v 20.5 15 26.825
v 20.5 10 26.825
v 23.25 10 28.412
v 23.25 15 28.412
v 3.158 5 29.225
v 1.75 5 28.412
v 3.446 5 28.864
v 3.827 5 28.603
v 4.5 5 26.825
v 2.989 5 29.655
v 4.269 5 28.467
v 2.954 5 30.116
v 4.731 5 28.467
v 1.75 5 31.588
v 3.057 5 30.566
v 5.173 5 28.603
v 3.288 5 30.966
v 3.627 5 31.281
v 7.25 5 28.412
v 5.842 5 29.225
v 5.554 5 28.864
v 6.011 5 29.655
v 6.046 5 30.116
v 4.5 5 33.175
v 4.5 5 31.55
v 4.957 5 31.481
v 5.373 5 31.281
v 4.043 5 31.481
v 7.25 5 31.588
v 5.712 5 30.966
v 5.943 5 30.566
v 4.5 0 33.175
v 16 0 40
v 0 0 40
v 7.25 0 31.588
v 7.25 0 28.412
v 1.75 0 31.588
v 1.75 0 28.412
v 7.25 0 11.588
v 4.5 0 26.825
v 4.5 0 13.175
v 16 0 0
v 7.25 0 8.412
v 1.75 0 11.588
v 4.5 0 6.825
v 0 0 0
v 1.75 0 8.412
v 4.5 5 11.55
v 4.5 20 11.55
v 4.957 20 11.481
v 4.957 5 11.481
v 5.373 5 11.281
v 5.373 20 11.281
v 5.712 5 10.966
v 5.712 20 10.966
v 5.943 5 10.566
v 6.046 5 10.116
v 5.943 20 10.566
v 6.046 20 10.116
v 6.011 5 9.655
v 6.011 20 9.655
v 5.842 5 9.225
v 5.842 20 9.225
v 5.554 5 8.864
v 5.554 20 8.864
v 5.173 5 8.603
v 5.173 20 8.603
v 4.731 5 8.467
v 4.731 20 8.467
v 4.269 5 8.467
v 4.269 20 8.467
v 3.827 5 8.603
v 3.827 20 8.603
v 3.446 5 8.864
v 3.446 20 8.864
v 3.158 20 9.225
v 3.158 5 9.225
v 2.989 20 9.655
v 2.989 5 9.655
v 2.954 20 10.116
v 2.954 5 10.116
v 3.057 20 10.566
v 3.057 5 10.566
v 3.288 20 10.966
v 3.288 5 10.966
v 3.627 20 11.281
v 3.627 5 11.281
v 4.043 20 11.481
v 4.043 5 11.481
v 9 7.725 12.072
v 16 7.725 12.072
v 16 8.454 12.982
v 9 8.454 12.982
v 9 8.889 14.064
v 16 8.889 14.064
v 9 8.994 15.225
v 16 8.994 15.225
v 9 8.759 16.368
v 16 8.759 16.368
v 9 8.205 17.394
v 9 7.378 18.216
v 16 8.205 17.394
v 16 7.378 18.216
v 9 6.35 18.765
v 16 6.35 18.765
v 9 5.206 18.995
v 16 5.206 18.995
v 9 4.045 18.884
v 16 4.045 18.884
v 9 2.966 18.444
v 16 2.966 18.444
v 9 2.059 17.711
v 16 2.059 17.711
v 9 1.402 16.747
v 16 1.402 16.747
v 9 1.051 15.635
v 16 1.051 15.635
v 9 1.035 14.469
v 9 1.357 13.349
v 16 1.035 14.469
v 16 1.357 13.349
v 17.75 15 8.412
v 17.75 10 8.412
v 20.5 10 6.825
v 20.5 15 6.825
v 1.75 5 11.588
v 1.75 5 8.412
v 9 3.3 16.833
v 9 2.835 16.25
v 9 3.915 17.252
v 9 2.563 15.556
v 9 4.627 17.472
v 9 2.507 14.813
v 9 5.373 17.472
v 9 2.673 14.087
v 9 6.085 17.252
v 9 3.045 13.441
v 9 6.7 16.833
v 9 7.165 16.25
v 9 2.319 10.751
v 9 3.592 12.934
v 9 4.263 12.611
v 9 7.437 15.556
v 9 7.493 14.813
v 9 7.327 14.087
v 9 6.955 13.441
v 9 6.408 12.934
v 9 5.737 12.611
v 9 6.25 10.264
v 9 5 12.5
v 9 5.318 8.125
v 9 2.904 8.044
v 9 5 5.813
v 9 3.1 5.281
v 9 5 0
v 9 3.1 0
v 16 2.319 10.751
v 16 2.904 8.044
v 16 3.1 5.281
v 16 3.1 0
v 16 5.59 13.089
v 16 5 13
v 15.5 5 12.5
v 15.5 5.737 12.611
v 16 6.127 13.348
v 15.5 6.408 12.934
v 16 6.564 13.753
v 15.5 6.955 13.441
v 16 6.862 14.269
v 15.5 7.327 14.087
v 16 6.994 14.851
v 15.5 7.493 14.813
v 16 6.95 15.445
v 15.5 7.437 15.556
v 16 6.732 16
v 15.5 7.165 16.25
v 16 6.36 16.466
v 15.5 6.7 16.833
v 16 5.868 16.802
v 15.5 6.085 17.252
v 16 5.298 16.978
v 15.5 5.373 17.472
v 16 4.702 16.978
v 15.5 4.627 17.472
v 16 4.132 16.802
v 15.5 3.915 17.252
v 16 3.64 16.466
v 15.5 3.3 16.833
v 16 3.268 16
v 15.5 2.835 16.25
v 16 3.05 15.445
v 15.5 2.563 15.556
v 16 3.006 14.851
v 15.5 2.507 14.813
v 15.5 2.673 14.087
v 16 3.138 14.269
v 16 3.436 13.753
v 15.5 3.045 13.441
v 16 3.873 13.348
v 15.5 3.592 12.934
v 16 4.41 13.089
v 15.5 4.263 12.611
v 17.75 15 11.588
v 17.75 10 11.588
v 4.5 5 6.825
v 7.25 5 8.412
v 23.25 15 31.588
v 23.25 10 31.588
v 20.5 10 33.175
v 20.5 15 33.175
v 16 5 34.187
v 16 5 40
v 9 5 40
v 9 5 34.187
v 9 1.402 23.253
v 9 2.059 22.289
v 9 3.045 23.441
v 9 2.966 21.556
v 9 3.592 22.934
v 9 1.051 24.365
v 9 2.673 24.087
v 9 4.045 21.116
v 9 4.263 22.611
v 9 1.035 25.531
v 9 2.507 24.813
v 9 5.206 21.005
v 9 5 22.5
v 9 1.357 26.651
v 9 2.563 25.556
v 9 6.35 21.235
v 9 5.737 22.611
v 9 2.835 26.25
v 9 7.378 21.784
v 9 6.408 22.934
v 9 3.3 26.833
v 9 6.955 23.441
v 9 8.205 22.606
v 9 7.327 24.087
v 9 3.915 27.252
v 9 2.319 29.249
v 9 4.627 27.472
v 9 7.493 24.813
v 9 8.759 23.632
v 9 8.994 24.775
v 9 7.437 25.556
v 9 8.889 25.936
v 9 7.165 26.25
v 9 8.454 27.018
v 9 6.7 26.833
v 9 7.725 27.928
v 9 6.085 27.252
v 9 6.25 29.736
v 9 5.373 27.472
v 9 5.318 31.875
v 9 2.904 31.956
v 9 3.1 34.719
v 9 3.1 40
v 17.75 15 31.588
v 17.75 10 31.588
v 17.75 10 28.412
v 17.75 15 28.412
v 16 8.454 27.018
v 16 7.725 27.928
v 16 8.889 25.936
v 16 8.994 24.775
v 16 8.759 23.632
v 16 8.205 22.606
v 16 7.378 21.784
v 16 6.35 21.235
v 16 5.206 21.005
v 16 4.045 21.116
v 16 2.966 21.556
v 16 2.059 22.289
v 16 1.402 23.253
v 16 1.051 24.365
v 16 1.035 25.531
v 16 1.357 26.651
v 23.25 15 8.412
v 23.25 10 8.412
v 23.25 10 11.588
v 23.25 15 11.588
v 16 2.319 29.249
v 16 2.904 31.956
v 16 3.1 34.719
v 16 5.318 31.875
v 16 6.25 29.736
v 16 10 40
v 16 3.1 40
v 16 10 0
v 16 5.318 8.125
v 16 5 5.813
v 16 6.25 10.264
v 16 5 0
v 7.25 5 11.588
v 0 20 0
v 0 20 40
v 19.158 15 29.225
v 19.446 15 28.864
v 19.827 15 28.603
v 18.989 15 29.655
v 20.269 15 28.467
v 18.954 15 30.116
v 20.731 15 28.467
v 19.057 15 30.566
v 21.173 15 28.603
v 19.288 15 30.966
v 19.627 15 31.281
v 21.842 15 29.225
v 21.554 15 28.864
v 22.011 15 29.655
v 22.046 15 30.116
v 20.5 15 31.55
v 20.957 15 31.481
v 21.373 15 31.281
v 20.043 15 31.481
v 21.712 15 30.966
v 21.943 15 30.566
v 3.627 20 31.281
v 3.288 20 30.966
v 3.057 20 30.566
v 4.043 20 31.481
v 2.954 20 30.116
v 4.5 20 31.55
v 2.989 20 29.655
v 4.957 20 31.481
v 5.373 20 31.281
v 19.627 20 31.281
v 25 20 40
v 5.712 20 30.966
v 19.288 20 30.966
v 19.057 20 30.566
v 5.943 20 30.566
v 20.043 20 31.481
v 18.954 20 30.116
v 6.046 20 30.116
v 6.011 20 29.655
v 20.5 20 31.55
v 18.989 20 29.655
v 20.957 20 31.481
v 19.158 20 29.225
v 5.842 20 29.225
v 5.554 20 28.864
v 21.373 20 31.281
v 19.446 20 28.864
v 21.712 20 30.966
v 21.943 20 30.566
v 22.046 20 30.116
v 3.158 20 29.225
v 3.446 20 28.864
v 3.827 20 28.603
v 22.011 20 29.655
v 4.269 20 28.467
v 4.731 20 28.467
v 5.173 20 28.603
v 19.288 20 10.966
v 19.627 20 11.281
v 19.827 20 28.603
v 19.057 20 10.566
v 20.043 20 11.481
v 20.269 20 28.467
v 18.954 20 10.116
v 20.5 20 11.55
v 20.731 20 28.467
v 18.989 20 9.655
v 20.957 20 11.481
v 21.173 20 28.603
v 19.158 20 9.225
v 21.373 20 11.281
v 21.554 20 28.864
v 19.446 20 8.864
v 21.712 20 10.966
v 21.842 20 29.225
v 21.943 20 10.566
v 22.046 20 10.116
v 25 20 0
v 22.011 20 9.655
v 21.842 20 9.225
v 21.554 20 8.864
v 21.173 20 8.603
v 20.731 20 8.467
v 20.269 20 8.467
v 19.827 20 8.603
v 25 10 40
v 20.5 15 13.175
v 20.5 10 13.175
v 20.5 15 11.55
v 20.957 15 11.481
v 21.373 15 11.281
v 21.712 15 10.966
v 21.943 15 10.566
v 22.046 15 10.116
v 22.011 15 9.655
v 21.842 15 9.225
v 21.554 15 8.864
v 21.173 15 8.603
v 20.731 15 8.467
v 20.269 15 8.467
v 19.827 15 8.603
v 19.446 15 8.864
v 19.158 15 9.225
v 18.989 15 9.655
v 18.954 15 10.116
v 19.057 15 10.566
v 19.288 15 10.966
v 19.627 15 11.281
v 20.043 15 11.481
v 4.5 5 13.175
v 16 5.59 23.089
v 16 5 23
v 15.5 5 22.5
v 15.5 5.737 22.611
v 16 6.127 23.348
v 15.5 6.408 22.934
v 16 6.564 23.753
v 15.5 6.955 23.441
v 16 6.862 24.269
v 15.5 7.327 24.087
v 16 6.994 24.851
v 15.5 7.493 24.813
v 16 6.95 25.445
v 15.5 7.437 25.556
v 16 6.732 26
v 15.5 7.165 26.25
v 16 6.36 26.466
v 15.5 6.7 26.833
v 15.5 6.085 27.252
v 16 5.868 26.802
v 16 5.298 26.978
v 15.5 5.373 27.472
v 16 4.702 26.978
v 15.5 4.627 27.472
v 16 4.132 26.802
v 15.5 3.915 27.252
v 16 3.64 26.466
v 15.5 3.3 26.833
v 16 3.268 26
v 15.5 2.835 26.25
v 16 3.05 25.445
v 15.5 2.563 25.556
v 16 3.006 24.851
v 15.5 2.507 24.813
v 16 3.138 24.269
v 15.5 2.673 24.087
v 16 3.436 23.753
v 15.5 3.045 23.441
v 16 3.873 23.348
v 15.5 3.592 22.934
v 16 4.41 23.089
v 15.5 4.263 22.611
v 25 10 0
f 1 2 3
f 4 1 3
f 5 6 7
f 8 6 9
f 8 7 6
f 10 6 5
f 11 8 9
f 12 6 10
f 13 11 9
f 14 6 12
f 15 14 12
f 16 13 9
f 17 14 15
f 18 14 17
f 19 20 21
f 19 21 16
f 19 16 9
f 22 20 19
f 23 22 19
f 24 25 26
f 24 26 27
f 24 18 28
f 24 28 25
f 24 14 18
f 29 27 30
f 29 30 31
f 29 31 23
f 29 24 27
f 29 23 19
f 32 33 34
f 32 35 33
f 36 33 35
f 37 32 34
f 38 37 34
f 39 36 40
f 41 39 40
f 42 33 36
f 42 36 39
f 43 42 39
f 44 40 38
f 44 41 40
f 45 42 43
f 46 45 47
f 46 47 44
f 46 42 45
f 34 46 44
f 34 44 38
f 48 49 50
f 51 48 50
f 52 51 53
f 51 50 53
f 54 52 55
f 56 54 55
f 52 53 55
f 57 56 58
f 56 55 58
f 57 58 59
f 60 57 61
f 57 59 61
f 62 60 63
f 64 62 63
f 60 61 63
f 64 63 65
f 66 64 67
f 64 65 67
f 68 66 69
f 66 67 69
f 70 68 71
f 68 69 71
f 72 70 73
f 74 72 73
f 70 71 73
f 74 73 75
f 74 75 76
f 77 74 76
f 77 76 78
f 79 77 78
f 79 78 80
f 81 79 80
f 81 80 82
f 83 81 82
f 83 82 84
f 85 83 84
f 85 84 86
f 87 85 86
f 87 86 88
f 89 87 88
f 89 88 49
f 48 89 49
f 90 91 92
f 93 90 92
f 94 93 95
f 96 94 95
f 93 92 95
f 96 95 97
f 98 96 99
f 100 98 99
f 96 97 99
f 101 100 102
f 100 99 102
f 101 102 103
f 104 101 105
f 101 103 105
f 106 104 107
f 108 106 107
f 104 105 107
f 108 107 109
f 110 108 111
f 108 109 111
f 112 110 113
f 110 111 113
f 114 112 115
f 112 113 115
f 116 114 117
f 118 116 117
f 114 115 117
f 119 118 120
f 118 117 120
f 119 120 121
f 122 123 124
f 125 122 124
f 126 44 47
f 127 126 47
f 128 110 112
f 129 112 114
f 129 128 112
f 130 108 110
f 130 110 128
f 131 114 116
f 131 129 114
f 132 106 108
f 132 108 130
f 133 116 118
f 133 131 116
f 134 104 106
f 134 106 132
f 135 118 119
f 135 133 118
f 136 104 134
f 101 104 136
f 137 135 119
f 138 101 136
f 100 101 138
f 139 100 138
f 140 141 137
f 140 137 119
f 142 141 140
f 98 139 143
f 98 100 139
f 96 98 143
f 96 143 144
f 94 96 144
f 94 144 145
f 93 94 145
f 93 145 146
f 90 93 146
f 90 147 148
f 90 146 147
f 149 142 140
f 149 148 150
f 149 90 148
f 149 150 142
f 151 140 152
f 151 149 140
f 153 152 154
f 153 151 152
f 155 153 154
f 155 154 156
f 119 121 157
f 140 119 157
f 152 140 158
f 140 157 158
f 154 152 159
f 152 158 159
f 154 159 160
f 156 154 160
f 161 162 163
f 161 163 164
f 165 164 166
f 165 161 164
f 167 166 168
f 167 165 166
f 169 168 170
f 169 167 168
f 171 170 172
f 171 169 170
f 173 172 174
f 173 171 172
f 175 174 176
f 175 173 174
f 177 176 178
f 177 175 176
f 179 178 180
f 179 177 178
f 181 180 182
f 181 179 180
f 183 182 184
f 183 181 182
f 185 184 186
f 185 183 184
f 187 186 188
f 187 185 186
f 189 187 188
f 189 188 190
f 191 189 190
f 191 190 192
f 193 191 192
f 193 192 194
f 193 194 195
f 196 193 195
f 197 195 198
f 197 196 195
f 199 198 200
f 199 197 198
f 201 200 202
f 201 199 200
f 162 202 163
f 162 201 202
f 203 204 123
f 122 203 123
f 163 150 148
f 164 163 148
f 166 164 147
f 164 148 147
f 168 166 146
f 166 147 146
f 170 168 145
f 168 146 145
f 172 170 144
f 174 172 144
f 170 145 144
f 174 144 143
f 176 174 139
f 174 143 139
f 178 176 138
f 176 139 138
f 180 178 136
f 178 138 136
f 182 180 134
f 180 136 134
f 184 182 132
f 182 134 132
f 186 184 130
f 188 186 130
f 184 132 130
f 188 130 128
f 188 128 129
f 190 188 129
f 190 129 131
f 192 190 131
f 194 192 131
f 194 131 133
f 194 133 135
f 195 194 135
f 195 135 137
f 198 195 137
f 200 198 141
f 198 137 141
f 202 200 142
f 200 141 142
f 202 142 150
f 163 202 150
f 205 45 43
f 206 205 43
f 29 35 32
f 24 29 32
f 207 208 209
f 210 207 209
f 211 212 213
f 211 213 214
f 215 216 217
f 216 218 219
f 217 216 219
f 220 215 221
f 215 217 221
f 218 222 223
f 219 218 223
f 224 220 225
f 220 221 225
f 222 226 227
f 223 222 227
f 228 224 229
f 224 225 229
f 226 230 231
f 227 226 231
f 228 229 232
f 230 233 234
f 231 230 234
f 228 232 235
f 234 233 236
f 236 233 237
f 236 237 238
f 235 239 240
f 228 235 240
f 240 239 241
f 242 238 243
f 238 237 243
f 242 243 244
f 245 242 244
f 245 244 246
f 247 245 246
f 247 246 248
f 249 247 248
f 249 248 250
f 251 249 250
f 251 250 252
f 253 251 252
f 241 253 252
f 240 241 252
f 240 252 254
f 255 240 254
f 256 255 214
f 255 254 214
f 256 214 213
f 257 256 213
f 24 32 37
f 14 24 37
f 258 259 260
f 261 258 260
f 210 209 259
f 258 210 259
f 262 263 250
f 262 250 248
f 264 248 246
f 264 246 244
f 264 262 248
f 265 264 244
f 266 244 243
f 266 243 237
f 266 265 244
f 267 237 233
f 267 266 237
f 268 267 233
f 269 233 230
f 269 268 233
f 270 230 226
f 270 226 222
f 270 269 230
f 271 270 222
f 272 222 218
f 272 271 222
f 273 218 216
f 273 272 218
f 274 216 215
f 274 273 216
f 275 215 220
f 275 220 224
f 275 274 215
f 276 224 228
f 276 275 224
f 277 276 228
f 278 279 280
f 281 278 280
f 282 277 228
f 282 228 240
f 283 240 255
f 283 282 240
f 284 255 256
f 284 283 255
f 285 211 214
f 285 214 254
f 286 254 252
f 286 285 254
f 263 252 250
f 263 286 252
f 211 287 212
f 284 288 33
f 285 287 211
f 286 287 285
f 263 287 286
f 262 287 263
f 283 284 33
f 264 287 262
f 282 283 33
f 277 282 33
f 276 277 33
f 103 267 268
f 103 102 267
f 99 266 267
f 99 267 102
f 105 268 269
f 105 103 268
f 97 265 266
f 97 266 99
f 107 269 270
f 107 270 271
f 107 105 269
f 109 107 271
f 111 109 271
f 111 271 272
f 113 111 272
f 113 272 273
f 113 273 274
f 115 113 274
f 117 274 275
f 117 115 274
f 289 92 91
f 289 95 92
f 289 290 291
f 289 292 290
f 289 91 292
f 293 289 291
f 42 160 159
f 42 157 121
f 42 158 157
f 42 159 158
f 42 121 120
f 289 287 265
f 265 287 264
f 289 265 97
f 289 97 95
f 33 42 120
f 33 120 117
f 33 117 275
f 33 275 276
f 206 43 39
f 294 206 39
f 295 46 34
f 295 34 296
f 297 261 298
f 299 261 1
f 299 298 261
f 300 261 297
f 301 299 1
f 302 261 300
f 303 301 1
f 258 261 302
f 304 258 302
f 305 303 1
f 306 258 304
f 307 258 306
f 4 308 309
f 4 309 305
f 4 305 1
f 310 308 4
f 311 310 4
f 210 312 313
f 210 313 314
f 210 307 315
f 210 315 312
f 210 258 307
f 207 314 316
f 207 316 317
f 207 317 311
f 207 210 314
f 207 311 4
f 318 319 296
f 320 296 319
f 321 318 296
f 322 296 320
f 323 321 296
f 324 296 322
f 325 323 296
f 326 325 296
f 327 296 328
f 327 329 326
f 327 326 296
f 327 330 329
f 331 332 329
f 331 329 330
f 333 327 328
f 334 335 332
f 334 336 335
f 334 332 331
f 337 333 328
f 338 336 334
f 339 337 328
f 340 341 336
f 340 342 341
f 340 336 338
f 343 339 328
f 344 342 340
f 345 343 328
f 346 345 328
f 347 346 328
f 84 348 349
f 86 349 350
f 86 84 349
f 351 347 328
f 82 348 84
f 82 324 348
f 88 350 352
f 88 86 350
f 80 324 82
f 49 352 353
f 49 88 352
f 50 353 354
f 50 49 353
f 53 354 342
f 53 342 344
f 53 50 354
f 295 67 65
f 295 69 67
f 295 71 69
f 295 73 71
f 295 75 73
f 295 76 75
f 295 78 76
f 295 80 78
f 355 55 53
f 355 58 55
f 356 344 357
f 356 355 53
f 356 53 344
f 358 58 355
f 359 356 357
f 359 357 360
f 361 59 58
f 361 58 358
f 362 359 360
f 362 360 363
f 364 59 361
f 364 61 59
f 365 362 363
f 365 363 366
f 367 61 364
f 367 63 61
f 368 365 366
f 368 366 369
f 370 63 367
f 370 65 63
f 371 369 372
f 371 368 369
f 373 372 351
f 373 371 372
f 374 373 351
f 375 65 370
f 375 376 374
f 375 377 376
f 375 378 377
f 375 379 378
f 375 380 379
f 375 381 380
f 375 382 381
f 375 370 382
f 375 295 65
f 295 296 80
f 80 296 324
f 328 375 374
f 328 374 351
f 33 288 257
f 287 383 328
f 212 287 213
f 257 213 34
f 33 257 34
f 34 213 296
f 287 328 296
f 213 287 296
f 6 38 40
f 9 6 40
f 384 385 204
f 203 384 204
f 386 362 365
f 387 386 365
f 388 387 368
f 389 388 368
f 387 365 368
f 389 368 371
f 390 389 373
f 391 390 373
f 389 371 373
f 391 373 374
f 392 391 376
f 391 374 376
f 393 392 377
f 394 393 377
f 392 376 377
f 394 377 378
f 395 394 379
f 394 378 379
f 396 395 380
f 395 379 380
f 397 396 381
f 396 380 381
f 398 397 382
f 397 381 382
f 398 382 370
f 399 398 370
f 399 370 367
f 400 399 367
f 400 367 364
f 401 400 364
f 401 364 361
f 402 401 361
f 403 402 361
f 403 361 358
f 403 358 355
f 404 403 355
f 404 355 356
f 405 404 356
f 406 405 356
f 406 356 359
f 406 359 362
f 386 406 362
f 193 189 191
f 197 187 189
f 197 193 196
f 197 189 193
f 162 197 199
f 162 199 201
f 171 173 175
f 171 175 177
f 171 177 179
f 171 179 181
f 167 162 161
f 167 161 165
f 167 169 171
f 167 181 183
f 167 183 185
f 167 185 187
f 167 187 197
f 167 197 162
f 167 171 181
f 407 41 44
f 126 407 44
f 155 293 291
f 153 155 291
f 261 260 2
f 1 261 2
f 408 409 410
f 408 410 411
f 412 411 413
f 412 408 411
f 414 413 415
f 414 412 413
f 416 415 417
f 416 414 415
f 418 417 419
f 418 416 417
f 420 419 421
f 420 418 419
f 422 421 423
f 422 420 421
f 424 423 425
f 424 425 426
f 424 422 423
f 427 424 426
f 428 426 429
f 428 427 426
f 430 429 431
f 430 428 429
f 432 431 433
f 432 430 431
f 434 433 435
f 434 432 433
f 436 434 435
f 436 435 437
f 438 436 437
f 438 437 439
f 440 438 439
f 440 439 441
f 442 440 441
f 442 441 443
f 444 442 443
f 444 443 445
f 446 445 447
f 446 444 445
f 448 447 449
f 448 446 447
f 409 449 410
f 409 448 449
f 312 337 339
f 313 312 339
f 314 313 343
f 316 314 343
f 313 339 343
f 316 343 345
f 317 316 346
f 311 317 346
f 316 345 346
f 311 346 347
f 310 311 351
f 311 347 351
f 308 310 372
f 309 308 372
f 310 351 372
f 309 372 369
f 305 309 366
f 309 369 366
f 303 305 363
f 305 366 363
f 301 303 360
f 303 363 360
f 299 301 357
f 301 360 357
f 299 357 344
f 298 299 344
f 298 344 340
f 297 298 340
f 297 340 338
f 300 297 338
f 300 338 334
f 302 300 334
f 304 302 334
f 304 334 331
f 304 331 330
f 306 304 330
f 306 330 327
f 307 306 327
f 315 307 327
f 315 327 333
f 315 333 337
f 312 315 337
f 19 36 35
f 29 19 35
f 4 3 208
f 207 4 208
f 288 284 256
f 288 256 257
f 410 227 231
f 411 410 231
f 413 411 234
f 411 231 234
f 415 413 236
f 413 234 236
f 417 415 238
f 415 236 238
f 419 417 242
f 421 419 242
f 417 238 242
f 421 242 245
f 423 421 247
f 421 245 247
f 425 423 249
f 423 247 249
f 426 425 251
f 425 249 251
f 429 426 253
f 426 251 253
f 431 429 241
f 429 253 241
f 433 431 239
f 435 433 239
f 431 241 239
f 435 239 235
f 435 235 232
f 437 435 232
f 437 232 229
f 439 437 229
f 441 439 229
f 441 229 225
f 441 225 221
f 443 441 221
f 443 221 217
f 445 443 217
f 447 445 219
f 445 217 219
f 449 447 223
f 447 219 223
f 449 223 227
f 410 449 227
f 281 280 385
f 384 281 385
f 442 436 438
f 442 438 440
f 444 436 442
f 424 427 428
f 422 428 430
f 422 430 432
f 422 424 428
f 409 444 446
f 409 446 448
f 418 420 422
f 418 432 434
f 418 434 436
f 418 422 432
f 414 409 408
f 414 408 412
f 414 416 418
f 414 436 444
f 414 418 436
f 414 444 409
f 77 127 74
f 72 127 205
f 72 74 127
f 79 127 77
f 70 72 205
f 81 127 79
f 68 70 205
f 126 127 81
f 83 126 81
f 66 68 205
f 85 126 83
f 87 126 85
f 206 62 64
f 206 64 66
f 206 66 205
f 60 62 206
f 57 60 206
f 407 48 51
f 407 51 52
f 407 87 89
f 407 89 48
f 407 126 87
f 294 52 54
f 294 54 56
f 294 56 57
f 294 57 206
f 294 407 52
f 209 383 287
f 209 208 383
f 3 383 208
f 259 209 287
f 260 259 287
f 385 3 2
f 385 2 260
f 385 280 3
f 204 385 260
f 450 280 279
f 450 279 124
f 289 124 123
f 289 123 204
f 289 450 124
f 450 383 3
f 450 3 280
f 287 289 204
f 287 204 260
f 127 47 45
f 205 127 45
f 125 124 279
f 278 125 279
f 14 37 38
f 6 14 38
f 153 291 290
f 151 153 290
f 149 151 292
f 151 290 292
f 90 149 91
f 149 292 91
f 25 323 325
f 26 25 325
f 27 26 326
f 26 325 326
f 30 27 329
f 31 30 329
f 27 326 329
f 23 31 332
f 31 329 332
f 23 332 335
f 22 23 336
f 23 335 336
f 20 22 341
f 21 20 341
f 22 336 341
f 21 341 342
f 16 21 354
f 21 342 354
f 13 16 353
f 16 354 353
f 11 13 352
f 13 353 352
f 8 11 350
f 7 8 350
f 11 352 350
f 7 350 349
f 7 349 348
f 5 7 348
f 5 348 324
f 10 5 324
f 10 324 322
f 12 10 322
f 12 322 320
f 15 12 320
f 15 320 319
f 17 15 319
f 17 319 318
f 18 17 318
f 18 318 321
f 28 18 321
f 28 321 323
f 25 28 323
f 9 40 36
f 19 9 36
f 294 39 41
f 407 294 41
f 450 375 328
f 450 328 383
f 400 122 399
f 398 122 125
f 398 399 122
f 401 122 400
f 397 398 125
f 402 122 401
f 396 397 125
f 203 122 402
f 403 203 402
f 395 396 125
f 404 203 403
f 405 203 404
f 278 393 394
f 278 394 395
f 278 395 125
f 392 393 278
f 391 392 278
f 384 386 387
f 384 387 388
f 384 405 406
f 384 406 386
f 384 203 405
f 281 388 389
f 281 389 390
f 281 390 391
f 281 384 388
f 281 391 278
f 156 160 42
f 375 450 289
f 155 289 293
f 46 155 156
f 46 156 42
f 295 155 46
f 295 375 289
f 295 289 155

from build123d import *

# Parameters (mm, degrees)
BOSS_EXTRUDE1_DEPTH = 40
SKETCH2_R           = 1.55
CUT_EXTRUDE1_DEPTH  = 52.23475383
CUT_EXTRUDE2_DEPTH  = 7
SKETCH4_R           = 2.5
BOSS_EXTRUDE2_DEPTH = 7
CHAMFER1_SIZE       = 0.5
CUT_EXTRUDE3_DEPTH  = 5
CUT_EXTRUDE4_DEPTH  = 5


with BuildPart() as part:
    # Sketch1 → Boss-Extrude1 (new body)
    with BuildSketch(Plane.XY):
        Polygon((16, 0), (0, 0), (0, 20), (25, 20), (25, 10), (16, 10), align=None)
    extrude(amount=BOSS_EXTRUDE1_DEPTH)

    # Sketch2 → Cut-Extrude1 (cut, through all)
    with BuildSketch(Plane(origin=(0, 20, 0), x_dir=(1, 0, 0), z_dir=(0, 1, 0))):
        with Locations(Location((4.5, -10, 0), (0, 0, 270))):
            Circle(SKETCH2_R)
        with Locations(Location((20.5, -10, 0), (0, 0, 270))):
            Circle(SKETCH2_R)
        with Locations(Location((4.5, -30, 0), (0, 0, 270))):
            Circle(SKETCH2_R)
        with Locations(Location((20.5, -30, 0), (0, 0, 270))):
            Circle(SKETCH2_R)
    extrude(amount=-CUT_EXTRUDE1_DEPTH, mode=Mode.SUBTRACT)

    # Sketch3 → Cut-Extrude2 (cut)
    with BuildSketch(Plane(origin=(16, 0, 0), x_dir=(0, 0, -1), z_dir=(1, 0, 0))):
        with BuildLine():
            Line((-40, 5), (-34.186947262, 5))
            ThreePointArc((-34.186947262, 5), (-30.77376681, 5.710822798), (-27.928110681, 7.725099602))
            ThreePointArc((-27.928110681, 7.725099602), (-21.078030656, 5.78622927), (-26.65147843, 1.356839422))
            ThreePointArc((-26.65147843, 1.356839422), (-30.592126256, 2.659238759), (-34.718950561, 3.1))
            Line((-34.718950561, 3.1), (-40, 3.1))
            Line((-40, 3.1), (-40, 5))
        make_face()
        with BuildLine():
            Line((0, 5), (-5.813052738, 5))
            ThreePointArc((-5.813052738, 5), (-9.22623319, 5.710822798), (-12.071889319, 7.725099602))
            ThreePointArc((-12.071889319, 7.725099602), (-18.921969344, 5.78622927), (-13.34852157, 1.356839422))
            ThreePointArc((-13.34852157, 1.356839422), (-9.407873744, 2.659238759), (-5.281049439, 3.1))
            Line((-5.281049439, 3.1), (0, 3.1))
            Line((0, 3.1), (0, 5))
        make_face()
    extrude(amount=-CUT_EXTRUDE2_DEPTH, mode=Mode.SUBTRACT)

    # Sketch4 → Boss-Extrude2 (add)
    with BuildSketch(Plane(origin=(9, 0, 0), x_dir=(0, 0, -1), z_dir=(1, 0, 0))):
        with Locations((-25, 5)):
            Circle(SKETCH4_R)
        with Locations((-15, 5)):
            Circle(SKETCH4_R)
    extrude(amount=BOSS_EXTRUDE2_DEPTH)

    # Chamfer1
    chamfer1_edges = [part.edges().sort_by_distance(p)[0] for p in [
        (16, 5, 27.5),
        (16, 5, 17.5),
    ]]
    chamfer(chamfer1_edges, length=CHAMFER1_SIZE)

    # Sketch5 → Cut-Extrude3 (cut)
    with BuildSketch(Plane.XZ):
        Polygon((7.249630657, 11.5875), (4.5, 13.175), (1.750369343, 11.5875), (1.750369343, 8.4125), (4.5, 6.825), (7.249630657, 8.4125), align=None)
        Polygon((7.249630657, 31.5875), (4.5, 33.175), (1.750369343, 31.5875), (1.750369343, 28.4125), (4.5, 26.825), (7.249630657, 28.4125), align=None)
    extrude(amount=-CUT_EXTRUDE3_DEPTH, mode=Mode.SUBTRACT)

    # Sketch6 → Cut-Extrude4 (cut)
    with BuildSketch(Plane.XZ.offset(-10)):
        Polygon((23.249630657, 11.5875), (20.5, 13.175), (17.750369343, 11.5875), (17.750369343, 8.4125), (20.5, 6.825), (23.249630657, 8.4125), align=None)
        Polygon((23.249630657, 28.4125), (23.249630657, 31.5875), (20.5, 33.175), (17.750369343, 31.5875), (17.750369343, 28.4125), (20.5, 26.825), align=None)
    extrude(amount=-CUT_EXTRUDE4_DEPTH, mode=Mode.SUBTRACT)


solid = part.part
